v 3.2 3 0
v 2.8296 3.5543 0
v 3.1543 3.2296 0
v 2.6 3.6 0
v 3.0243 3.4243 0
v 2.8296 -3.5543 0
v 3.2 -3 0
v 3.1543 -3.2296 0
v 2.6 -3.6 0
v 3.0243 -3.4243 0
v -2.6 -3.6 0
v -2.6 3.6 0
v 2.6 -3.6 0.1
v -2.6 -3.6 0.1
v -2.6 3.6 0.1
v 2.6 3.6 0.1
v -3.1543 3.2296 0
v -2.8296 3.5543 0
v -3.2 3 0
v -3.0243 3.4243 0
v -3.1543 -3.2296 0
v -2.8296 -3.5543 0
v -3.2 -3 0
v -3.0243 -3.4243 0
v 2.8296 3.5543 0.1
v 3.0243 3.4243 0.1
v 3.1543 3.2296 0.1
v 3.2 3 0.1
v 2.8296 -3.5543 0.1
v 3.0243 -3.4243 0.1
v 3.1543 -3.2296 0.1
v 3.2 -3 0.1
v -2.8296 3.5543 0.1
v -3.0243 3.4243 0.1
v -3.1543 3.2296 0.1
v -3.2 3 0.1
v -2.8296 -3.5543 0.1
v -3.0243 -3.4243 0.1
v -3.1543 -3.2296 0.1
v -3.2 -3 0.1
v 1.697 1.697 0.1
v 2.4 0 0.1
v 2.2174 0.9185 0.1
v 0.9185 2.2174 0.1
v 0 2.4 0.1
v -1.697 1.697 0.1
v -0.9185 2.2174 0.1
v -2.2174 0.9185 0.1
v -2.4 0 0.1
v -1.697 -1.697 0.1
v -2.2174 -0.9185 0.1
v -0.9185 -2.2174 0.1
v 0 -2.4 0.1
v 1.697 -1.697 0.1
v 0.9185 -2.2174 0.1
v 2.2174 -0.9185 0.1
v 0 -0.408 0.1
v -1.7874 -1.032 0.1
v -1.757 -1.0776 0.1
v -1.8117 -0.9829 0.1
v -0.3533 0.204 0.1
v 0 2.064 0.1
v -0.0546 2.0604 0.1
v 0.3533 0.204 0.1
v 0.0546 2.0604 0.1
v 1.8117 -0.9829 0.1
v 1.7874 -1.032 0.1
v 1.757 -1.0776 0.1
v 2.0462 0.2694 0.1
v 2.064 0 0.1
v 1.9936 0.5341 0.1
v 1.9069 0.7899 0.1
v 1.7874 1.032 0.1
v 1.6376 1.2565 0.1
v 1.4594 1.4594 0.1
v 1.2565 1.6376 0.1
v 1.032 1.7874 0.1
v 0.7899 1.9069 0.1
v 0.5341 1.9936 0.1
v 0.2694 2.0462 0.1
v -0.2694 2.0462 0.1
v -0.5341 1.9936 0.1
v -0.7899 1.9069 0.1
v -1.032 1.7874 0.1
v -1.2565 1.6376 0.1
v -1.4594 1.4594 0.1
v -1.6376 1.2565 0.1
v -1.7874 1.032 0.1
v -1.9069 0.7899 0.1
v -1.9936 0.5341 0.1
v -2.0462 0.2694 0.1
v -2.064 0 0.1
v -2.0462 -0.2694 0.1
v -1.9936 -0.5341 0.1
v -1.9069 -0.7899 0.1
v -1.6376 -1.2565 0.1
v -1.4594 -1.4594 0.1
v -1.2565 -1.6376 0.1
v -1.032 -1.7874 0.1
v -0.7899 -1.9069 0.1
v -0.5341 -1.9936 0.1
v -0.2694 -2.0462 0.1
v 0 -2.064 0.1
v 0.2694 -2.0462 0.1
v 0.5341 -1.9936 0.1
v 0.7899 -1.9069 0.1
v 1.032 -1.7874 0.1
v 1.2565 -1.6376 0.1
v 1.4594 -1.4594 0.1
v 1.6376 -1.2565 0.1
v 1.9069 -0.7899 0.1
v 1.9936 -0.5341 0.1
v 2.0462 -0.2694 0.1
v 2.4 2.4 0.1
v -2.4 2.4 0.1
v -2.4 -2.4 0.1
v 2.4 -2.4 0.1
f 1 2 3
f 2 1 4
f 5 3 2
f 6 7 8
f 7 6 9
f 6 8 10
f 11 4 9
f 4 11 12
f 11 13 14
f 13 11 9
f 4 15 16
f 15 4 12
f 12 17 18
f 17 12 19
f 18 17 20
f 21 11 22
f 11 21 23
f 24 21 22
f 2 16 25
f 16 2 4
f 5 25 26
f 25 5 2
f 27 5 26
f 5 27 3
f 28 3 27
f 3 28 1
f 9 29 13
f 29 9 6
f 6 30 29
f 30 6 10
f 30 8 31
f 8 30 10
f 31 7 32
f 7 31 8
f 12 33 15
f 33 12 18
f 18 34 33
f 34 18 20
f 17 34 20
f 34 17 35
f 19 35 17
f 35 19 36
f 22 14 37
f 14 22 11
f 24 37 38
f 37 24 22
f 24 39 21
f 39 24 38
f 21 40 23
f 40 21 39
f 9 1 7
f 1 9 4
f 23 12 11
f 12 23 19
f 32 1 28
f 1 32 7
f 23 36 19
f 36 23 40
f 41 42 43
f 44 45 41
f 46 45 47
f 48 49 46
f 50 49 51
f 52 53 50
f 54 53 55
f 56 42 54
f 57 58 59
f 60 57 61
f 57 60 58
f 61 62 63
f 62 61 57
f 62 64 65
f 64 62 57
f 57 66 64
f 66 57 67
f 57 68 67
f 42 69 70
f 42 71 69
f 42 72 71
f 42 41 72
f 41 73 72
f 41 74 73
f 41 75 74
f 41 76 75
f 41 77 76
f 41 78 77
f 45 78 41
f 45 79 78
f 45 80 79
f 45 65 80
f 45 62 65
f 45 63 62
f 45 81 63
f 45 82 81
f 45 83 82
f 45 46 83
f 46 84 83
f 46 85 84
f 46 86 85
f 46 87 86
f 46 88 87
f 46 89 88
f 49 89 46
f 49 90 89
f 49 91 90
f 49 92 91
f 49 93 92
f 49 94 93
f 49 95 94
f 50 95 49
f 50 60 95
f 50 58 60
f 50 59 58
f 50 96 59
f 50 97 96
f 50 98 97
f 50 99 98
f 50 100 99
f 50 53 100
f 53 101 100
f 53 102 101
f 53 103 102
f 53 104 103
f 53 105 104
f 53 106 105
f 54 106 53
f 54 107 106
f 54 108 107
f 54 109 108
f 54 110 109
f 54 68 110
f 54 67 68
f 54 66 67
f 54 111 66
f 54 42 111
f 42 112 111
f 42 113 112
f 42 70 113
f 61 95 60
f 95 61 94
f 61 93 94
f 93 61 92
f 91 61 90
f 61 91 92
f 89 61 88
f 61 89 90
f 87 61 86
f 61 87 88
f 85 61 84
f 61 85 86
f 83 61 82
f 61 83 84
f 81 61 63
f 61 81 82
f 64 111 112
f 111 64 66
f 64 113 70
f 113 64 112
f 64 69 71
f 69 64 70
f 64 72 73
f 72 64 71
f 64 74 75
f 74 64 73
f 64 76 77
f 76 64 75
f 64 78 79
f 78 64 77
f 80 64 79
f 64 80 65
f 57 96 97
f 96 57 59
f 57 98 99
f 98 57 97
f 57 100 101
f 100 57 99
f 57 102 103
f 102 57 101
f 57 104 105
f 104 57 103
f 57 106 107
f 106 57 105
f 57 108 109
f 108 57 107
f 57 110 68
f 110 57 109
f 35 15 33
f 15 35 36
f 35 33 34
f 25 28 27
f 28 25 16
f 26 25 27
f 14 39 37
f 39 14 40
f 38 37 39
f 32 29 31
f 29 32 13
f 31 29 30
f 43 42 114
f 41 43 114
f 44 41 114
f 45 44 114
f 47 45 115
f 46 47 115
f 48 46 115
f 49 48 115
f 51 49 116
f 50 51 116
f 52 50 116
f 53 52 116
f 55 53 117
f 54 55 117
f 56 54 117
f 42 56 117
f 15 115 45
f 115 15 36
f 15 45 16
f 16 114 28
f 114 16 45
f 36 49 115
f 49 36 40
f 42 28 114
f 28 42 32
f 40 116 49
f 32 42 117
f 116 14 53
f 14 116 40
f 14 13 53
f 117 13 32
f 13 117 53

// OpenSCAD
// file: ../p/box3u12.scad
use <../lib.scad>
function ldraw_lib__box3u12() = [
// 0 Box with 3 Parallel Faces without Any Edges
// 0 Name: box3u12.dat
// 0 Author: J.C. Tchang [tchang]
// 0 !LDRAW_ORG Primitive UPDATE 2014-02
// 0 !LICENSE Licensed under CC BY 4.0 : see CAreadme.txt
// 
// 0 BFC CERTIFY CCW
  [0,"BFC","CERTIFY"],
  [0,"BFC","CCW"],
// 
// 0 !HISTORY 2014-12-23 [PTadmin] Official Update 2014-02
// 
// 
// 4 16 -1 1 1 1 1 1 1 1 -1 -1 1 -1
  [4,16,-1,1,1,1,1,1,1,1,-1,-1,1,-1],
// 4 16 -1 1 1 -1 0 1 1 0 1 1 1 1
  [4,16,-1,1,1,-1,0,1,1,0,1,1,1,1],
// 4 16 1 1 -1 1 0 -1 -1 0 -1 -1 1 -1
  [4,16,1,1,-1,1,0,-1,-1,0,-1,-1,1,-1],
];
module ldraw_lib__box3u12(step=0, col=false, unit=2/5, alt=false, line=0.2, solid=!$preview)
    makepoly(ldraw_lib__box3u12(), step=step, col=col, unit=unit, alt=alt, line=line, solid=solid);
ldraw_lib__box3u12(line=0.2);
// file: ../p/1-4cyli.scad
use <../lib.scad>
function ldraw_lib__1_4cyli() = [
// 0 Cylinder 0.25
// 0 Name: 1-4cyli.dat
// 0 Author: James Jessiman
// 0 !LDRAW_ORG Primitive UPDATE 2012-01
// 0 !LICENSE Licensed under CC BY 4.0 : see CAreadme.txt
// 
// 0 BFC CERTIFY CCW
  [0,"BFC","CERTIFY"],
  [0,"BFC","CCW"],
// 
// 0 !HISTORY 2002-03-23 [sbliss] Added BFC statement.
// 0 !HISTORY 2002-04-25 [PTadmin] Official Update 2002-02
// 0 !HISTORY 2007-06-22 [PTadmin] Header formatted for Contributor Agreement
// 0 !HISTORY 2008-07-01 [PTadmin] Official Update 2008-01
// 0 !HISTORY 2012-02-16 [Philo] Changed to CCW
// 0 !HISTORY 2012-03-30 [PTadmin] Official Update 2012-01
// 
// 
// 4 16 1 1 0 0.9239 1 0.3827 0.9239 0 0.3827 1 0 0
  [4,16,1,1,0,0.9239,1,0.3827,0.9239,0,0.3827,1,0,0],
// 5 24 1 0 0 1 1 0 0.9239 0 0.3827 1 0 -1
  [5,24,1,0,0,1,1,0,0.9239,0,0.3827,1,0,-1],
// 4 16 0.9239 1 0.3827 0.7071 1 0.7071 0.7071 0 0.7071 0.9239 0 0.3827
  [4,16,0.9239,1,0.3827,0.7071,1,0.7071,0.7071,0,0.7071,0.9239,0,0.3827],
// 5 24 0.9239 0 0.3827 0.9239 1 0.3827 0.7071 0 0.7071 1 0 0
  [5,24,0.9239,0,0.3827,0.9239,1,0.3827,0.7071,0,0.7071,1,0,0],
// 4 16 0.7071 1 0.7071 0.3827 1 0.9239 0.3827 0 0.9239 0.7071 0 0.7071
  [4,16,0.7071,1,0.7071,0.3827,1,0.9239,0.3827,0,0.9239,0.7071,0,0.7071],
// 5 24 0.7071 0 0.7071 0.7071 1 0.7071 0.3827 0 0.9239 0.9239 0 0.3827
  [5,24,0.7071,0,0.7071,0.7071,1,0.7071,0.3827,0,0.9239,0.9239,0,0.3827],
// 4 16 0.3827 1 0.9239 0 1 1 0 0 1 0.3827 0 0.9239
  [4,16,0.3827,1,0.9239,0,1,1,0,0,1,0.3827,0,0.9239],
// 5 24 0.3827 0 0.9239 0.3827 1 0.9239 0 0 1 0.7071 0 0.7071
  [5,24,0.3827,0,0.9239,0.3827,1,0.9239,0,0,1,0.7071,0,0.7071],
// 5 24 0 0 1 0 1 1 0.3827 0 0.9239 -1 0 1
  [5,24,0,0,1,0,1,1,0.3827,0,0.9239,-1,0,1],
];
module ldraw_lib__1_4cyli(step=0, col=false, unit=2/5, alt=false, line=0.2, solid=!$preview)
    makepoly(ldraw_lib__1_4cyli(), step=step, col=col, unit=unit, alt=alt, line=line, solid=solid);
ldraw_lib__1_4cyli(line=0.2);
// file: ../p/1-8chrd.scad
use <../lib.scad>
function ldraw_lib__1_8chrd() = [
// 0 Chord 0.125
// 0 Name: 1-8chrd.dat
// 0 Author: Orion Pobursky [OrionP]
// 0 !LDRAW_ORG Primitive UPDATE 2023-05
// 0 !LICENSE Licensed under CC BY 4.0 : see CAreadme.txt
// 
// 0 BFC CERTIFY CCW
  [0,"BFC","CERTIFY"],
  [0,"BFC","CCW"],
// 
// 0 !HISTORY 2004-04-22 [PTadmin] Official Update 2004-02
// 0 !HISTORY 2007-06-22 [PTadmin] Header formatted for Contributor Agreement
// 0 !HISTORY 2008-07-01 [PTadmin] Official Update 2008-01
// 0 !HISTORY 2023-10-27 [OrionP] Rebuilt with PrimGen2, original author westrate
// 0 !HISTORY 2023-10-31 [OrionP] Official Update 2023-05
// 
// 3 16 1 0 0 0.9239 0 0.3827 0.7071 0 0.7071
  [3,16,1,0,0,0.9239,0,0.3827,0.7071,0,0.7071],
];
module ldraw_lib__1_8chrd(step=0, col=false, unit=2/5, alt=false, line=0.2, solid=!$preview)
    makepoly(ldraw_lib__1_8chrd(), step=step, col=col, unit=unit, alt=alt, line=line, solid=solid);
ldraw_lib__1_8chrd(line=0.2);
// file: s/stickerback008x009.scad
use <../../lib.scad>
use <../../p/1-4chrd.scad>
use <../../p/1-4cyli.scad>
use <../../p/box3u12.scad>
function ldraw_lib__s__stickerback008x009() = [
// 0 ~Sticker Back  0.8 x  0.9
// 0 Name: s\stickerback008x009.dat
// 0 Author: Massimo Maso [Sirio]
// 0 !LDRAW_ORG Subpart UPDATE 2026-05
// 0 !LICENSE Licensed under CC BY 4.0 : see CAreadme.txt
// 
// 0 BFC CERTIFY CCW
  [0,"BFC","CERTIFY"],
  [0,"BFC","CCW"],
// 
// 0 !HISTORY 2025-08-31 [OrionP] Official Update 2025-08
// 0 !HISTORY 2026-04-18 [MagFors] corrected length
// 0 !HISTORY 2026-05-31 [OrionP] Official Update 2026-05
// 
// 0 // Primitives
// 1 16 -7.5 0 6.5 -1.5 0 0 0 -1 0 0 0 1.5 1-4chrd.dat
  [1,16,-7.5,0,6.5,-1.5,0,0,0,-1,0,0,0,1.5, ldraw_lib__1_4chrd()],
// 1 16 7.5 0 6.5 1.5 0 0 0 -1 0 0 0 1.5 1-4chrd.dat
  [1,16,7.5,0,6.5,1.5,0,0,0,-1,0,0,0,1.5, ldraw_lib__1_4chrd()],
// 1 16 0 -.25 0 0 0 9 0 .25 0 6.5 0 0 box3u12.dat
  [1,16,0,-.25,0,0,0,9,0,.25,0,6.5,0,0, ldraw_lib__box3u12()],
// 1 16 -7.5 0 -6.5 -1.5 0 0 0 -1 0 0 0 -1.5 1-4chrd.dat
  [1,16,-7.5,0,-6.5,-1.5,0,0,0,-1,0,0,0,-1.5, ldraw_lib__1_4chrd()],
// 1 16 7.5 0 -6.5 1.5 0 0 0 -1 0 0 0 -1.5 1-4chrd.dat
  [1,16,7.5,0,-6.5,1.5,0,0,0,-1,0,0,0,-1.5, ldraw_lib__1_4chrd()],
// 1 16 -7.5 0 6.5 -1.5 0 0 0 -.25 0 0 0 1.5 1-4cyli.dat
  [1,16,-7.5,0,6.5,-1.5,0,0,0,-.25,0,0,0,1.5, ldraw_lib__1_4cyli()],
// 1 16 7.5 0 6.5 1.5 0 0 0 -.25 0 0 0 1.5 1-4cyli.dat
  [1,16,7.5,0,6.5,1.5,0,0,0,-.25,0,0,0,1.5, ldraw_lib__1_4cyli()],
// 1 16 -7.5 0 -6.5 -1.5 0 0 0 -.25 0 0 0 -1.5 1-4cyli.dat
  [1,16,-7.5,0,-6.5,-1.5,0,0,0,-.25,0,0,0,-1.5, ldraw_lib__1_4cyli()],
// 1 16 7.5 0 -6.5 1.5 0 0 0 -.25 0 0 0 -1.5 1-4cyli.dat
  [1,16,7.5,0,-6.5,1.5,0,0,0,-.25,0,0,0,-1.5, ldraw_lib__1_4cyli()],
// 0 // Bottom face
// 4 16 -7.5 0 8 7.5 0 8 9 0 6.5 -9 0 6.5
  [4,16,-7.5,0,8,7.5,0,8,9,0,6.5,-9,0,6.5],
// 4 16 -7.5 0 -8 -9 0 -6.5 9 0 -6.5 7.5 0 -8
  [4,16,-7.5,0,-8,-9,0,-6.5,9,0,-6.5,7.5,0,-8],
// 0 // Lateral face
// 4 16 -7.5 0 8 -7.5 -.25 8 7.5 -.25 8 7.5 0 8
  [4,16,-7.5,0,8,-7.5,-.25,8,7.5,-.25,8,7.5,0,8],
// 4 16 -7.5 0 -8 7.5 0 -8 7.5 -.25 -8 -7.5 -.25 -8
  [4,16,-7.5,0,-8,7.5,0,-8,7.5,-.25,-8,-7.5,-.25,-8],
];
module ldraw_lib__s__stickerback008x009(step=0, col=false, unit=2/5, alt=false, line=0.2, solid=!$preview)
    makepoly(ldraw_lib__s__stickerback008x009(), step=step, col=col, unit=unit, alt=alt, line=line, solid=solid);
ldraw_lib__s__stickerback008x009(line=0.2);
// file: ../p/logo-mercedes-star-inner.scad
use <../lib.scad>
function ldraw_lib__logo_mercedes_star_inner() = [
// 0 Logo Mercedes Star Inner
// 0 Name: logo-mercedes-star-inner.dat
// 0 Author: Massimo Maso [Sirio]
// 0 !LDRAW_ORG Primitive UPDATE 2025-05
// 0 !LICENSE Licensed under CC BY 4.0 : see CAreadme.txt
// 
// 0 !HELP Outside ise a regular circle radius 5
// 
// 0 BFC CERTIFY CCW
  [0,"BFC","CERTIFY"],
  [0,"BFC","CCW"],
// 
// 0 !HISTORY 2025-05-28 [OrionP] Official Update 2025-05
// 
// 0 // Faces
// 4 16 -.7361 0 .425 -4.1534 0 -1.1128 -3.9728 0 -1.6456 -3.7743 0 -2.0477
  [4,16,-.7361,0,.425,-4.1534,0,-1.1128,-3.9728,0,-1.6456,-3.7743,0,-2.0477],
// 4 16 -.7361 0 .425 -4.3 0 0 -4.263 0 -.5612 -4.1534 0 -1.1128
  [4,16,-.7361,0,.425,-4.3,0,0,-4.263,0,-.5612,-4.1534,0,-1.1128],
// 4 16 -.7361 0 .425 -4.1534 0 1.1128 -4.263 0 .5612 -4.3 0 0
  [4,16,-.7361,0,.425,-4.1534,0,1.1128,-4.263,0,.5612,-4.3,0,0],
// 4 16 -.7361 0 .425 -3.7238 0 2.15 -3.9728 0 1.6456 -4.1534 0 1.1128
  [4,16,-.7361,0,.425,-3.7238,0,2.15,-3.9728,0,1.6456,-4.1534,0,1.1128],
// 4 16 -.7361 0 .425 -3.0405 0 3.0405 -3.4116 0 2.6178 -3.7238 0 2.15
  [4,16,-.7361,0,.425,-3.0405,0,3.0405,-3.4116,0,2.6178,-3.7238,0,2.15],
// 4 16 -.7361 0 .425 -2.15 0 3.7238 -2.6178 0 3.4116 -3.0405 0 3.0405
  [4,16,-.7361,0,.425,-2.15,0,3.7238,-2.6178,0,3.4116,-3.0405,0,3.0405],
// 4 16 -.7361 0 .425 -1.1128 0 4.1534 -1.6456 0 3.9728 -2.15 0 3.7238
  [4,16,-.7361,0,.425,-1.1128,0,4.1534,-1.6456,0,3.9728,-2.15,0,3.7238],
// 4 16 -.7361 0 .425 -.1138 0 4.2925 -.5612 0 4.263 -1.1128 0 4.1534
  [4,16,-.7361,0,.425,-.1138,0,4.2925,-.5612,0,4.263,-1.1128,0,4.1534],
// 4 16 .7361 0 .425 3.7743 0 -2.0477 3.9728 0 -1.6456 4.1534 0 -1.1128
  [4,16,.7361,0,.425,3.7743,0,-2.0477,3.9728,0,-1.6456,4.1534,0,-1.1128],
// 4 16 .7361 0 .425 4.1534 0 -1.1128 4.263 0 -.5612 4.3 0 0
  [4,16,.7361,0,.425,4.1534,0,-1.1128,4.263,0,-.5612,4.3,0,0],
// 4 16 .7361 0 .425 4.3 0 0 4.263 0 .5612 4.1534 0 1.1128
  [4,16,.7361,0,.425,4.3,0,0,4.263,0,.5612,4.1534,0,1.1128],
// 4 16 .7361 0 .425 4.1534 0 1.1128 3.9728 0 1.6456 3.7238 0 2.15
  [4,16,.7361,0,.425,4.1534,0,1.1128,3.9728,0,1.6456,3.7238,0,2.15],
// 4 16 .7361 0 .425 3.7238 0 2.15 3.4116 0 2.6178 3.0405 0 3.0405
  [4,16,.7361,0,.425,3.7238,0,2.15,3.4116,0,2.6178,3.0405,0,3.0405],
// 4 16 .7361 0 .425 3.0405 0 3.0405 2.6178 0 3.4116 2.15 0 3.7238
  [4,16,.7361,0,.425,3.0405,0,3.0405,2.6178,0,3.4116,2.15,0,3.7238],
// 4 16 .7361 0 .425 2.15 0 3.7238 1.6456 0 3.9728 1.1128 0 4.1534
  [4,16,.7361,0,.425,2.15,0,3.7238,1.6456,0,3.9728,1.1128,0,4.1534],
// 4 16 .7361 0 .425 1.1128 0 4.1534 .5612 0 4.263 .1138 0 4.2925
  [4,16,.7361,0,.425,1.1128,0,4.1534,.5612,0,4.263,.1138,0,4.2925],
// 4 16 0 0 -.85 -3.6605 0 -2.2449 -3.4116 0 -2.6178 -3.0405 0 -3.0405
  [4,16,0,0,-.85,-3.6605,0,-2.2449,-3.4116,0,-2.6178,-3.0405,0,-3.0405],
// 4 16 0 0 -.85 -3.0405 0 -3.0405 -2.6178 0 -3.4116 -2.15 0 -3.7238
  [4,16,0,0,-.85,-3.0405,0,-3.0405,-2.6178,0,-3.4116,-2.15,0,-3.7238],
// 4 16 0 0 -.85 -2.15 0 -3.7238 -1.6456 0 -3.9728 -1.1128 0 -4.1534
  [4,16,0,0,-.85,-2.15,0,-3.7238,-1.6456,0,-3.9728,-1.1128,0,-4.1534],
// 4 16 0 0 -.85 -1.1128 0 -4.1534 -.5612 0 -4.263 0 0 -4.3
  [4,16,0,0,-.85,-1.1128,0,-4.1534,-.5612,0,-4.263,0,0,-4.3],
// 4 16 0 0 -.85 0 0 -4.3 .5612 0 -4.263 1.1128 0 -4.1534
  [4,16,0,0,-.85,0,0,-4.3,.5612,0,-4.263,1.1128,0,-4.1534],
// 4 16 0 0 -.85 1.1128 0 -4.1534 1.6456 0 -3.9728 2.15 0 -3.7238
  [4,16,0,0,-.85,1.1128,0,-4.1534,1.6456,0,-3.9728,2.15,0,-3.7238],
// 4 16 0 0 -.85 2.15 0 -3.7238 2.6178 0 -3.4116 3.0405 0 -3.0405
  [4,16,0,0,-.85,2.15,0,-3.7238,2.6178,0,-3.4116,3.0405,0,-3.0405],
// 4 16 0 0 -.85 3.0405 0 -3.0405 3.4116 0 -2.6178 3.6605 0 -2.2449
  [4,16,0,0,-.85,3.0405,0,-3.0405,3.4116,0,-2.6178,3.6605,0,-2.2449],
];
module ldraw_lib__logo_mercedes_star_inner(step=0, col=false, unit=2/5, alt=false, line=0.2, solid=!$preview)
    makepoly(ldraw_lib__logo_mercedes_star_inner(), step=step, col=col, unit=unit, alt=alt, line=line, solid=solid);
ldraw_lib__logo_mercedes_star_inner(line=0.2);
// file: ../p/4-4ndis.scad
use <../lib.scad>
function ldraw_lib__4_4ndis() = [
// 0 Disc Negative 1.0
// 0 Name: 4-4ndis.dat
// 0 Author: James Jessiman
// 0 !LDRAW_ORG Primitive UPDATE 2012-01
// 0 !LICENSE Licensed under CC BY 4.0 : see CAreadme.txt
// 
// 0 BFC CERTIFY CCW
  [0,"BFC","CERTIFY"],
  [0,"BFC","CCW"],
// 
// 0 !HISTORY 2002-03-23 [sbliss] Added BFC statement; compacted code
// 0 !HISTORY 2002-04-25 [PTadmin] Official Update 2002-02
// 0 !HISTORY 2007-06-24 [PTadmin] Header formatted for Contributor Agreement
// 0 !HISTORY 2008-07-01 [PTadmin] Official Update 2008-01
// 0 !HISTORY 2012-02-16 [Philo] Changed to CCW
// 0 !HISTORY 2012-03-30 [PTadmin] Official Update 2012-01
// 
// 
// 3 16 0.9239 0 0.3827 1 0 0 1 0 1
  [3,16,0.9239,0,0.3827,1,0,0,1,0,1],
// 3 16 0.7071 0 0.7071 0.9239 0 0.3827 1 0 1
  [3,16,0.7071,0,0.7071,0.9239,0,0.3827,1,0,1],
// 3 16 0.3827 0 0.9239 0.7071 0 0.7071 1 0 1
  [3,16,0.3827,0,0.9239,0.7071,0,0.7071,1,0,1],
// 3 16 0 0 1 0.3827 0 0.9239 1 0 1
  [3,16,0,0,1,0.3827,0,0.9239,1,0,1],
// 3 16 -0.3827 0 0.9239 0 0 1 -1 0 1
  [3,16,-0.3827,0,0.9239,0,0,1,-1,0,1],
// 3 16 -0.7071 0 0.7071 -0.3827 0 0.9239 -1 0 1
  [3,16,-0.7071,0,0.7071,-0.3827,0,0.9239,-1,0,1],
// 3 16 -0.9239 0 0.3827 -0.7071 0 0.7071 -1 0 1
  [3,16,-0.9239,0,0.3827,-0.7071,0,0.7071,-1,0,1],
// 3 16 -1 0 0 -0.9239 0 0.3827 -1 0 1
  [3,16,-1,0,0,-0.9239,0,0.3827,-1,0,1],
// 3 16 -0.9239 0 -0.3827 -1 0 0 -1 0 -1
  [3,16,-0.9239,0,-0.3827,-1,0,0,-1,0,-1],
// 3 16 -0.7071 0 -0.7071 -0.9239 0 -0.3827 -1 0 -1
  [3,16,-0.7071,0,-0.7071,-0.9239,0,-0.3827,-1,0,-1],
// 3 16 -0.3827 0 -0.9239 -0.7071 0 -0.7071 -1 0 -1
  [3,16,-0.3827,0,-0.9239,-0.7071,0,-0.7071,-1,0,-1],
// 3 16 0 0 -1 -0.3827 0 -0.9239 -1 0 -1
  [3,16,0,0,-1,-0.3827,0,-0.9239,-1,0,-1],
// 3 16 0.3827 0 -0.9239 0 0 -1 1 0 -1
  [3,16,0.3827,0,-0.9239,0,0,-1,1,0,-1],
// 3 16 0.7071 0 -0.7071 0.3827 0 -0.9239 1 0 -1
  [3,16,0.7071,0,-0.7071,0.3827,0,-0.9239,1,0,-1],
// 3 16 0.9239 0 -0.3827 0.7071 0 -0.7071 1 0 -1
  [3,16,0.9239,0,-0.3827,0.7071,0,-0.7071,1,0,-1],
// 3 16 1 0 0 0.9239 0 -0.3827 1 0 -1
  [3,16,1,0,0,0.9239,0,-0.3827,1,0,-1],
];
module ldraw_lib__4_4ndis(step=0, col=false, unit=2/5, alt=false, line=0.2, solid=!$preview)
    makepoly(ldraw_lib__4_4ndis(), step=step, col=col, unit=unit, alt=alt, line=line, solid=solid);
ldraw_lib__4_4ndis(line=0.2);
// file: ../p/1-4chrd.scad
use <../lib.scad>
function ldraw_lib__1_4chrd() = [
// 0 Chord 0.25
// 0 Name: 1-4chrd.dat
// 0 Author: Max Martin Richter [MMR1988]
// 0 !LDRAW_ORG Primitive UPDATE 2023-05
// 0 !LICENSE Licensed under CC BY 4.0 : see CAreadme.txt
// 
// 0 BFC CERTIFY CCW
  [0,"BFC","CERTIFY"],
  [0,"BFC","CCW"],
// 
// 0 !HISTORY 2004-04-22 [PTadmin] Official Update 2004-02
// 0 !HISTORY 2007-10-09 [PTadmin] Header formatted for Contributor Agreement
// 0 !HISTORY 2008-07-01 [PTadmin] Official Update 2008-01
// 0 !HISTORY 2012-08-02 [MMR1988] Re-creation with PrimGen2 and Rectifier
// 0 !HISTORY 2012-08-09 [PTadmin] Official Update 2012-02
// 0 !HISTORY 2023-10-27 [OrionP] Change author to MMR1988 from hafhead
// 0 !HISTORY 2023-10-31 [OrionP] Official Update 2023-05
// 
// 4 16 0.9239 0 0.3827 0.3827 0 0.9239 0 0 1 1 0 0
  [4,16,0.9239,0,0.3827,0.3827,0,0.9239,0,0,1,1,0,0],
// 3 16 0.7071 0 0.7071 0.3827 0 0.9239 0.9239 0 0.3827
  [3,16,0.7071,0,0.7071,0.3827,0,0.9239,0.9239,0,0.3827],
];
module ldraw_lib__1_4chrd(step=0, col=false, unit=2/5, alt=false, line=0.2, solid=!$preview)
    makepoly(ldraw_lib__1_4chrd(), step=step, col=col, unit=unit, alt=alt, line=line, solid=solid);
ldraw_lib__1_4chrd(line=0.2);
// main file
use <../lib.scad>
use <../p/1-4chrd.scad>
use <../p/4-4ndis.scad>
use <../p/logo-mercedes-star-inner.scad>
use <../p/logo-mercedes-star.scad>
use <s/stickerback008x009.scad>
function ldraw_lib__6177973m() = [
// 0 Sticker  0.9 x  0.8 with White Mercedes Logo on Silver Background
// 0 Name: 6177973m.dat
// 0 Author: Massimo Maso [Sirio]
// 0 !LDRAW_ORG Part UPDATE 2026-09
// 0 !LICENSE Licensed under CC BY 4.0 : see CAreadme.txt
// 
// 0 BFC CERTIFY CCW
  [0,"BFC","CERTIFY"],
  [0,"BFC","CCW"],
// 
// 0 !CATEGORY Sticker
// 0 !KEYWORDS 2016, 44, 6, AMG, BrickLink 75883stk01, Brickowl 129746, F1, Formula
// 0 !KEYWORDS Hybrid, Lewis Hamilton, Mercedes, Nico Rosberg, One, Petronas
// 0 !KEYWORDS Rebrickable 30901, Set 75883, Set 75995, Speed Champions, Team
// 0 !KEYWORDS Toto Wolff, W07
// 
// 0 !HISTORY 2026-04-18 [MagFors] corrected length
// 0 !HISTORY 2026-09-30 [OrionP] Official Update 2026-09
// 
// 0 // Stickerback
// 1 16 0 0 0 0 0 1 0 1 0 -1 0 0 s\stickerback008x009.dat
  [1,16,0,0,0,0,0,1,0,1,0,-1,0,0, ldraw_lib__s__stickerback008x009()],
// 0 // Logo primitives
// 1 15 0 -.25 0 1.2 0 0 0 1 0 0 0 1.2 logo-mercedes-star.dat
  [1,15,0,-.25,0,1.2,0,0,0,1,0,0,0,1.2, ldraw_lib__logo_mercedes_star()],
// 1 80 0 -.25 0 1.2 0 0 0 1 0 0 0 1.2 logo-mercedes-star-inner.dat
  [1,80,0,-.25,0,1.2,0,0,0,1,0,0,0,1.2, ldraw_lib__logo_mercedes_star_inner()],
// 0 // Primitives
// 1 80 -6.5 -.25 7.5 -1.5 0 0 0 1 0 0 0 1.5 1-4chrd.dat
  [1,80,-6.5,-.25,7.5,-1.5,0,0,0,1,0,0,0,1.5, ldraw_lib__1_4chrd()],
// 1 80 6.5 -.25 7.5 1.5 0 0 0 1 0 0 0 1.5 1-4chrd.dat
  [1,80,6.5,-.25,7.5,1.5,0,0,0,1,0,0,0,1.5, ldraw_lib__1_4chrd()],
// 1 80 -6.5 -.25 -7.5 -1.5 0 0 0 1 0 0 0 -1.5 1-4chrd.dat
  [1,80,-6.5,-.25,-7.5,-1.5,0,0,0,1,0,0,0,-1.5, ldraw_lib__1_4chrd()],
// 1 80 6.5 -.25 -7.5 1.5 0 0 0 1 0 0 0 -1.5 1-4chrd.dat
  [1,80,6.5,-.25,-7.5,1.5,0,0,0,1,0,0,0,-1.5, ldraw_lib__1_4chrd()],
// 1 80 0 -.25 0 6 0 0 0 1 0 0 0 6 4-4ndis.dat
  [1,80,0,-.25,0,6,0,0,0,1,0,0,0,6, ldraw_lib__4_4ndis()],
// 0 // Top face
// 0 // Grey complementary faces
// 4 80 -6.5 -.25 9 -8 -.25 7.5 -6 -.25 6 0 -.25 6
  [4,80,-6.5,-.25,9,-8,-.25,7.5,-6,-.25,6,0,-.25,6],
// 3 80 -6.5 -.25 9 0 -.25 6 6.5 -.25 9
  [3,80,-6.5,-.25,9,0,-.25,6,6.5,-.25,9],
// 4 80 6.5 -.25 9 0 -.25 6 6 -.25 6 8 -.25 7.5
  [4,80,6.5,-.25,9,0,-.25,6,6,-.25,6,8,-.25,7.5],
// 4 80 -8 -.25 7.5 -8 -.25 -7.5 -6 -.25 0 -6 -.25 6
  [4,80,-8,-.25,7.5,-8,-.25,-7.5,-6,-.25,0,-6,-.25,6],
// 4 80 8 -.25 7.5 6 -.25 6 6 -.25 0 8 -.25 -7.5
  [4,80,8,-.25,7.5,6,-.25,6,6,-.25,0,8,-.25,-7.5],
// 3 80 -8 -.25 -7.5 -6 -.25 -6 -6 -.25 0
  [3,80,-8,-.25,-7.5,-6,-.25,-6,-6,-.25,0],
// 3 80 8 -.25 -7.5 6 -.25 0 6 -.25 -6
  [3,80,8,-.25,-7.5,6,-.25,0,6,-.25,-6],
// 4 80 -6.5 -.25 -9 0 -.25 -6 -6 -.25 -6 -8 -.25 -7.5
  [4,80,-6.5,-.25,-9,0,-.25,-6,-6,-.25,-6,-8,-.25,-7.5],
// 3 80 -6.5 -.25 -9 6.5 -.25 -9 0 -.25 -6
  [3,80,-6.5,-.25,-9,6.5,-.25,-9,0,-.25,-6],
// 4 80 6.5 -.25 -9 8 -.25 -7.5 6 -.25 -6 0 -.25 -6
  [4,80,6.5,-.25,-9,8,-.25,-7.5,6,-.25,-6,0,-.25,-6],
];
module ldraw_lib__6177973m(step=0, col=false, unit=2/5, alt=false, line=0.2, solid=!$preview)
    makepoly(ldraw_lib__6177973m(), step=step, col=col, unit=unit, alt=alt, line=line, solid=solid);
ldraw_lib__6177973m(line=0.2);
